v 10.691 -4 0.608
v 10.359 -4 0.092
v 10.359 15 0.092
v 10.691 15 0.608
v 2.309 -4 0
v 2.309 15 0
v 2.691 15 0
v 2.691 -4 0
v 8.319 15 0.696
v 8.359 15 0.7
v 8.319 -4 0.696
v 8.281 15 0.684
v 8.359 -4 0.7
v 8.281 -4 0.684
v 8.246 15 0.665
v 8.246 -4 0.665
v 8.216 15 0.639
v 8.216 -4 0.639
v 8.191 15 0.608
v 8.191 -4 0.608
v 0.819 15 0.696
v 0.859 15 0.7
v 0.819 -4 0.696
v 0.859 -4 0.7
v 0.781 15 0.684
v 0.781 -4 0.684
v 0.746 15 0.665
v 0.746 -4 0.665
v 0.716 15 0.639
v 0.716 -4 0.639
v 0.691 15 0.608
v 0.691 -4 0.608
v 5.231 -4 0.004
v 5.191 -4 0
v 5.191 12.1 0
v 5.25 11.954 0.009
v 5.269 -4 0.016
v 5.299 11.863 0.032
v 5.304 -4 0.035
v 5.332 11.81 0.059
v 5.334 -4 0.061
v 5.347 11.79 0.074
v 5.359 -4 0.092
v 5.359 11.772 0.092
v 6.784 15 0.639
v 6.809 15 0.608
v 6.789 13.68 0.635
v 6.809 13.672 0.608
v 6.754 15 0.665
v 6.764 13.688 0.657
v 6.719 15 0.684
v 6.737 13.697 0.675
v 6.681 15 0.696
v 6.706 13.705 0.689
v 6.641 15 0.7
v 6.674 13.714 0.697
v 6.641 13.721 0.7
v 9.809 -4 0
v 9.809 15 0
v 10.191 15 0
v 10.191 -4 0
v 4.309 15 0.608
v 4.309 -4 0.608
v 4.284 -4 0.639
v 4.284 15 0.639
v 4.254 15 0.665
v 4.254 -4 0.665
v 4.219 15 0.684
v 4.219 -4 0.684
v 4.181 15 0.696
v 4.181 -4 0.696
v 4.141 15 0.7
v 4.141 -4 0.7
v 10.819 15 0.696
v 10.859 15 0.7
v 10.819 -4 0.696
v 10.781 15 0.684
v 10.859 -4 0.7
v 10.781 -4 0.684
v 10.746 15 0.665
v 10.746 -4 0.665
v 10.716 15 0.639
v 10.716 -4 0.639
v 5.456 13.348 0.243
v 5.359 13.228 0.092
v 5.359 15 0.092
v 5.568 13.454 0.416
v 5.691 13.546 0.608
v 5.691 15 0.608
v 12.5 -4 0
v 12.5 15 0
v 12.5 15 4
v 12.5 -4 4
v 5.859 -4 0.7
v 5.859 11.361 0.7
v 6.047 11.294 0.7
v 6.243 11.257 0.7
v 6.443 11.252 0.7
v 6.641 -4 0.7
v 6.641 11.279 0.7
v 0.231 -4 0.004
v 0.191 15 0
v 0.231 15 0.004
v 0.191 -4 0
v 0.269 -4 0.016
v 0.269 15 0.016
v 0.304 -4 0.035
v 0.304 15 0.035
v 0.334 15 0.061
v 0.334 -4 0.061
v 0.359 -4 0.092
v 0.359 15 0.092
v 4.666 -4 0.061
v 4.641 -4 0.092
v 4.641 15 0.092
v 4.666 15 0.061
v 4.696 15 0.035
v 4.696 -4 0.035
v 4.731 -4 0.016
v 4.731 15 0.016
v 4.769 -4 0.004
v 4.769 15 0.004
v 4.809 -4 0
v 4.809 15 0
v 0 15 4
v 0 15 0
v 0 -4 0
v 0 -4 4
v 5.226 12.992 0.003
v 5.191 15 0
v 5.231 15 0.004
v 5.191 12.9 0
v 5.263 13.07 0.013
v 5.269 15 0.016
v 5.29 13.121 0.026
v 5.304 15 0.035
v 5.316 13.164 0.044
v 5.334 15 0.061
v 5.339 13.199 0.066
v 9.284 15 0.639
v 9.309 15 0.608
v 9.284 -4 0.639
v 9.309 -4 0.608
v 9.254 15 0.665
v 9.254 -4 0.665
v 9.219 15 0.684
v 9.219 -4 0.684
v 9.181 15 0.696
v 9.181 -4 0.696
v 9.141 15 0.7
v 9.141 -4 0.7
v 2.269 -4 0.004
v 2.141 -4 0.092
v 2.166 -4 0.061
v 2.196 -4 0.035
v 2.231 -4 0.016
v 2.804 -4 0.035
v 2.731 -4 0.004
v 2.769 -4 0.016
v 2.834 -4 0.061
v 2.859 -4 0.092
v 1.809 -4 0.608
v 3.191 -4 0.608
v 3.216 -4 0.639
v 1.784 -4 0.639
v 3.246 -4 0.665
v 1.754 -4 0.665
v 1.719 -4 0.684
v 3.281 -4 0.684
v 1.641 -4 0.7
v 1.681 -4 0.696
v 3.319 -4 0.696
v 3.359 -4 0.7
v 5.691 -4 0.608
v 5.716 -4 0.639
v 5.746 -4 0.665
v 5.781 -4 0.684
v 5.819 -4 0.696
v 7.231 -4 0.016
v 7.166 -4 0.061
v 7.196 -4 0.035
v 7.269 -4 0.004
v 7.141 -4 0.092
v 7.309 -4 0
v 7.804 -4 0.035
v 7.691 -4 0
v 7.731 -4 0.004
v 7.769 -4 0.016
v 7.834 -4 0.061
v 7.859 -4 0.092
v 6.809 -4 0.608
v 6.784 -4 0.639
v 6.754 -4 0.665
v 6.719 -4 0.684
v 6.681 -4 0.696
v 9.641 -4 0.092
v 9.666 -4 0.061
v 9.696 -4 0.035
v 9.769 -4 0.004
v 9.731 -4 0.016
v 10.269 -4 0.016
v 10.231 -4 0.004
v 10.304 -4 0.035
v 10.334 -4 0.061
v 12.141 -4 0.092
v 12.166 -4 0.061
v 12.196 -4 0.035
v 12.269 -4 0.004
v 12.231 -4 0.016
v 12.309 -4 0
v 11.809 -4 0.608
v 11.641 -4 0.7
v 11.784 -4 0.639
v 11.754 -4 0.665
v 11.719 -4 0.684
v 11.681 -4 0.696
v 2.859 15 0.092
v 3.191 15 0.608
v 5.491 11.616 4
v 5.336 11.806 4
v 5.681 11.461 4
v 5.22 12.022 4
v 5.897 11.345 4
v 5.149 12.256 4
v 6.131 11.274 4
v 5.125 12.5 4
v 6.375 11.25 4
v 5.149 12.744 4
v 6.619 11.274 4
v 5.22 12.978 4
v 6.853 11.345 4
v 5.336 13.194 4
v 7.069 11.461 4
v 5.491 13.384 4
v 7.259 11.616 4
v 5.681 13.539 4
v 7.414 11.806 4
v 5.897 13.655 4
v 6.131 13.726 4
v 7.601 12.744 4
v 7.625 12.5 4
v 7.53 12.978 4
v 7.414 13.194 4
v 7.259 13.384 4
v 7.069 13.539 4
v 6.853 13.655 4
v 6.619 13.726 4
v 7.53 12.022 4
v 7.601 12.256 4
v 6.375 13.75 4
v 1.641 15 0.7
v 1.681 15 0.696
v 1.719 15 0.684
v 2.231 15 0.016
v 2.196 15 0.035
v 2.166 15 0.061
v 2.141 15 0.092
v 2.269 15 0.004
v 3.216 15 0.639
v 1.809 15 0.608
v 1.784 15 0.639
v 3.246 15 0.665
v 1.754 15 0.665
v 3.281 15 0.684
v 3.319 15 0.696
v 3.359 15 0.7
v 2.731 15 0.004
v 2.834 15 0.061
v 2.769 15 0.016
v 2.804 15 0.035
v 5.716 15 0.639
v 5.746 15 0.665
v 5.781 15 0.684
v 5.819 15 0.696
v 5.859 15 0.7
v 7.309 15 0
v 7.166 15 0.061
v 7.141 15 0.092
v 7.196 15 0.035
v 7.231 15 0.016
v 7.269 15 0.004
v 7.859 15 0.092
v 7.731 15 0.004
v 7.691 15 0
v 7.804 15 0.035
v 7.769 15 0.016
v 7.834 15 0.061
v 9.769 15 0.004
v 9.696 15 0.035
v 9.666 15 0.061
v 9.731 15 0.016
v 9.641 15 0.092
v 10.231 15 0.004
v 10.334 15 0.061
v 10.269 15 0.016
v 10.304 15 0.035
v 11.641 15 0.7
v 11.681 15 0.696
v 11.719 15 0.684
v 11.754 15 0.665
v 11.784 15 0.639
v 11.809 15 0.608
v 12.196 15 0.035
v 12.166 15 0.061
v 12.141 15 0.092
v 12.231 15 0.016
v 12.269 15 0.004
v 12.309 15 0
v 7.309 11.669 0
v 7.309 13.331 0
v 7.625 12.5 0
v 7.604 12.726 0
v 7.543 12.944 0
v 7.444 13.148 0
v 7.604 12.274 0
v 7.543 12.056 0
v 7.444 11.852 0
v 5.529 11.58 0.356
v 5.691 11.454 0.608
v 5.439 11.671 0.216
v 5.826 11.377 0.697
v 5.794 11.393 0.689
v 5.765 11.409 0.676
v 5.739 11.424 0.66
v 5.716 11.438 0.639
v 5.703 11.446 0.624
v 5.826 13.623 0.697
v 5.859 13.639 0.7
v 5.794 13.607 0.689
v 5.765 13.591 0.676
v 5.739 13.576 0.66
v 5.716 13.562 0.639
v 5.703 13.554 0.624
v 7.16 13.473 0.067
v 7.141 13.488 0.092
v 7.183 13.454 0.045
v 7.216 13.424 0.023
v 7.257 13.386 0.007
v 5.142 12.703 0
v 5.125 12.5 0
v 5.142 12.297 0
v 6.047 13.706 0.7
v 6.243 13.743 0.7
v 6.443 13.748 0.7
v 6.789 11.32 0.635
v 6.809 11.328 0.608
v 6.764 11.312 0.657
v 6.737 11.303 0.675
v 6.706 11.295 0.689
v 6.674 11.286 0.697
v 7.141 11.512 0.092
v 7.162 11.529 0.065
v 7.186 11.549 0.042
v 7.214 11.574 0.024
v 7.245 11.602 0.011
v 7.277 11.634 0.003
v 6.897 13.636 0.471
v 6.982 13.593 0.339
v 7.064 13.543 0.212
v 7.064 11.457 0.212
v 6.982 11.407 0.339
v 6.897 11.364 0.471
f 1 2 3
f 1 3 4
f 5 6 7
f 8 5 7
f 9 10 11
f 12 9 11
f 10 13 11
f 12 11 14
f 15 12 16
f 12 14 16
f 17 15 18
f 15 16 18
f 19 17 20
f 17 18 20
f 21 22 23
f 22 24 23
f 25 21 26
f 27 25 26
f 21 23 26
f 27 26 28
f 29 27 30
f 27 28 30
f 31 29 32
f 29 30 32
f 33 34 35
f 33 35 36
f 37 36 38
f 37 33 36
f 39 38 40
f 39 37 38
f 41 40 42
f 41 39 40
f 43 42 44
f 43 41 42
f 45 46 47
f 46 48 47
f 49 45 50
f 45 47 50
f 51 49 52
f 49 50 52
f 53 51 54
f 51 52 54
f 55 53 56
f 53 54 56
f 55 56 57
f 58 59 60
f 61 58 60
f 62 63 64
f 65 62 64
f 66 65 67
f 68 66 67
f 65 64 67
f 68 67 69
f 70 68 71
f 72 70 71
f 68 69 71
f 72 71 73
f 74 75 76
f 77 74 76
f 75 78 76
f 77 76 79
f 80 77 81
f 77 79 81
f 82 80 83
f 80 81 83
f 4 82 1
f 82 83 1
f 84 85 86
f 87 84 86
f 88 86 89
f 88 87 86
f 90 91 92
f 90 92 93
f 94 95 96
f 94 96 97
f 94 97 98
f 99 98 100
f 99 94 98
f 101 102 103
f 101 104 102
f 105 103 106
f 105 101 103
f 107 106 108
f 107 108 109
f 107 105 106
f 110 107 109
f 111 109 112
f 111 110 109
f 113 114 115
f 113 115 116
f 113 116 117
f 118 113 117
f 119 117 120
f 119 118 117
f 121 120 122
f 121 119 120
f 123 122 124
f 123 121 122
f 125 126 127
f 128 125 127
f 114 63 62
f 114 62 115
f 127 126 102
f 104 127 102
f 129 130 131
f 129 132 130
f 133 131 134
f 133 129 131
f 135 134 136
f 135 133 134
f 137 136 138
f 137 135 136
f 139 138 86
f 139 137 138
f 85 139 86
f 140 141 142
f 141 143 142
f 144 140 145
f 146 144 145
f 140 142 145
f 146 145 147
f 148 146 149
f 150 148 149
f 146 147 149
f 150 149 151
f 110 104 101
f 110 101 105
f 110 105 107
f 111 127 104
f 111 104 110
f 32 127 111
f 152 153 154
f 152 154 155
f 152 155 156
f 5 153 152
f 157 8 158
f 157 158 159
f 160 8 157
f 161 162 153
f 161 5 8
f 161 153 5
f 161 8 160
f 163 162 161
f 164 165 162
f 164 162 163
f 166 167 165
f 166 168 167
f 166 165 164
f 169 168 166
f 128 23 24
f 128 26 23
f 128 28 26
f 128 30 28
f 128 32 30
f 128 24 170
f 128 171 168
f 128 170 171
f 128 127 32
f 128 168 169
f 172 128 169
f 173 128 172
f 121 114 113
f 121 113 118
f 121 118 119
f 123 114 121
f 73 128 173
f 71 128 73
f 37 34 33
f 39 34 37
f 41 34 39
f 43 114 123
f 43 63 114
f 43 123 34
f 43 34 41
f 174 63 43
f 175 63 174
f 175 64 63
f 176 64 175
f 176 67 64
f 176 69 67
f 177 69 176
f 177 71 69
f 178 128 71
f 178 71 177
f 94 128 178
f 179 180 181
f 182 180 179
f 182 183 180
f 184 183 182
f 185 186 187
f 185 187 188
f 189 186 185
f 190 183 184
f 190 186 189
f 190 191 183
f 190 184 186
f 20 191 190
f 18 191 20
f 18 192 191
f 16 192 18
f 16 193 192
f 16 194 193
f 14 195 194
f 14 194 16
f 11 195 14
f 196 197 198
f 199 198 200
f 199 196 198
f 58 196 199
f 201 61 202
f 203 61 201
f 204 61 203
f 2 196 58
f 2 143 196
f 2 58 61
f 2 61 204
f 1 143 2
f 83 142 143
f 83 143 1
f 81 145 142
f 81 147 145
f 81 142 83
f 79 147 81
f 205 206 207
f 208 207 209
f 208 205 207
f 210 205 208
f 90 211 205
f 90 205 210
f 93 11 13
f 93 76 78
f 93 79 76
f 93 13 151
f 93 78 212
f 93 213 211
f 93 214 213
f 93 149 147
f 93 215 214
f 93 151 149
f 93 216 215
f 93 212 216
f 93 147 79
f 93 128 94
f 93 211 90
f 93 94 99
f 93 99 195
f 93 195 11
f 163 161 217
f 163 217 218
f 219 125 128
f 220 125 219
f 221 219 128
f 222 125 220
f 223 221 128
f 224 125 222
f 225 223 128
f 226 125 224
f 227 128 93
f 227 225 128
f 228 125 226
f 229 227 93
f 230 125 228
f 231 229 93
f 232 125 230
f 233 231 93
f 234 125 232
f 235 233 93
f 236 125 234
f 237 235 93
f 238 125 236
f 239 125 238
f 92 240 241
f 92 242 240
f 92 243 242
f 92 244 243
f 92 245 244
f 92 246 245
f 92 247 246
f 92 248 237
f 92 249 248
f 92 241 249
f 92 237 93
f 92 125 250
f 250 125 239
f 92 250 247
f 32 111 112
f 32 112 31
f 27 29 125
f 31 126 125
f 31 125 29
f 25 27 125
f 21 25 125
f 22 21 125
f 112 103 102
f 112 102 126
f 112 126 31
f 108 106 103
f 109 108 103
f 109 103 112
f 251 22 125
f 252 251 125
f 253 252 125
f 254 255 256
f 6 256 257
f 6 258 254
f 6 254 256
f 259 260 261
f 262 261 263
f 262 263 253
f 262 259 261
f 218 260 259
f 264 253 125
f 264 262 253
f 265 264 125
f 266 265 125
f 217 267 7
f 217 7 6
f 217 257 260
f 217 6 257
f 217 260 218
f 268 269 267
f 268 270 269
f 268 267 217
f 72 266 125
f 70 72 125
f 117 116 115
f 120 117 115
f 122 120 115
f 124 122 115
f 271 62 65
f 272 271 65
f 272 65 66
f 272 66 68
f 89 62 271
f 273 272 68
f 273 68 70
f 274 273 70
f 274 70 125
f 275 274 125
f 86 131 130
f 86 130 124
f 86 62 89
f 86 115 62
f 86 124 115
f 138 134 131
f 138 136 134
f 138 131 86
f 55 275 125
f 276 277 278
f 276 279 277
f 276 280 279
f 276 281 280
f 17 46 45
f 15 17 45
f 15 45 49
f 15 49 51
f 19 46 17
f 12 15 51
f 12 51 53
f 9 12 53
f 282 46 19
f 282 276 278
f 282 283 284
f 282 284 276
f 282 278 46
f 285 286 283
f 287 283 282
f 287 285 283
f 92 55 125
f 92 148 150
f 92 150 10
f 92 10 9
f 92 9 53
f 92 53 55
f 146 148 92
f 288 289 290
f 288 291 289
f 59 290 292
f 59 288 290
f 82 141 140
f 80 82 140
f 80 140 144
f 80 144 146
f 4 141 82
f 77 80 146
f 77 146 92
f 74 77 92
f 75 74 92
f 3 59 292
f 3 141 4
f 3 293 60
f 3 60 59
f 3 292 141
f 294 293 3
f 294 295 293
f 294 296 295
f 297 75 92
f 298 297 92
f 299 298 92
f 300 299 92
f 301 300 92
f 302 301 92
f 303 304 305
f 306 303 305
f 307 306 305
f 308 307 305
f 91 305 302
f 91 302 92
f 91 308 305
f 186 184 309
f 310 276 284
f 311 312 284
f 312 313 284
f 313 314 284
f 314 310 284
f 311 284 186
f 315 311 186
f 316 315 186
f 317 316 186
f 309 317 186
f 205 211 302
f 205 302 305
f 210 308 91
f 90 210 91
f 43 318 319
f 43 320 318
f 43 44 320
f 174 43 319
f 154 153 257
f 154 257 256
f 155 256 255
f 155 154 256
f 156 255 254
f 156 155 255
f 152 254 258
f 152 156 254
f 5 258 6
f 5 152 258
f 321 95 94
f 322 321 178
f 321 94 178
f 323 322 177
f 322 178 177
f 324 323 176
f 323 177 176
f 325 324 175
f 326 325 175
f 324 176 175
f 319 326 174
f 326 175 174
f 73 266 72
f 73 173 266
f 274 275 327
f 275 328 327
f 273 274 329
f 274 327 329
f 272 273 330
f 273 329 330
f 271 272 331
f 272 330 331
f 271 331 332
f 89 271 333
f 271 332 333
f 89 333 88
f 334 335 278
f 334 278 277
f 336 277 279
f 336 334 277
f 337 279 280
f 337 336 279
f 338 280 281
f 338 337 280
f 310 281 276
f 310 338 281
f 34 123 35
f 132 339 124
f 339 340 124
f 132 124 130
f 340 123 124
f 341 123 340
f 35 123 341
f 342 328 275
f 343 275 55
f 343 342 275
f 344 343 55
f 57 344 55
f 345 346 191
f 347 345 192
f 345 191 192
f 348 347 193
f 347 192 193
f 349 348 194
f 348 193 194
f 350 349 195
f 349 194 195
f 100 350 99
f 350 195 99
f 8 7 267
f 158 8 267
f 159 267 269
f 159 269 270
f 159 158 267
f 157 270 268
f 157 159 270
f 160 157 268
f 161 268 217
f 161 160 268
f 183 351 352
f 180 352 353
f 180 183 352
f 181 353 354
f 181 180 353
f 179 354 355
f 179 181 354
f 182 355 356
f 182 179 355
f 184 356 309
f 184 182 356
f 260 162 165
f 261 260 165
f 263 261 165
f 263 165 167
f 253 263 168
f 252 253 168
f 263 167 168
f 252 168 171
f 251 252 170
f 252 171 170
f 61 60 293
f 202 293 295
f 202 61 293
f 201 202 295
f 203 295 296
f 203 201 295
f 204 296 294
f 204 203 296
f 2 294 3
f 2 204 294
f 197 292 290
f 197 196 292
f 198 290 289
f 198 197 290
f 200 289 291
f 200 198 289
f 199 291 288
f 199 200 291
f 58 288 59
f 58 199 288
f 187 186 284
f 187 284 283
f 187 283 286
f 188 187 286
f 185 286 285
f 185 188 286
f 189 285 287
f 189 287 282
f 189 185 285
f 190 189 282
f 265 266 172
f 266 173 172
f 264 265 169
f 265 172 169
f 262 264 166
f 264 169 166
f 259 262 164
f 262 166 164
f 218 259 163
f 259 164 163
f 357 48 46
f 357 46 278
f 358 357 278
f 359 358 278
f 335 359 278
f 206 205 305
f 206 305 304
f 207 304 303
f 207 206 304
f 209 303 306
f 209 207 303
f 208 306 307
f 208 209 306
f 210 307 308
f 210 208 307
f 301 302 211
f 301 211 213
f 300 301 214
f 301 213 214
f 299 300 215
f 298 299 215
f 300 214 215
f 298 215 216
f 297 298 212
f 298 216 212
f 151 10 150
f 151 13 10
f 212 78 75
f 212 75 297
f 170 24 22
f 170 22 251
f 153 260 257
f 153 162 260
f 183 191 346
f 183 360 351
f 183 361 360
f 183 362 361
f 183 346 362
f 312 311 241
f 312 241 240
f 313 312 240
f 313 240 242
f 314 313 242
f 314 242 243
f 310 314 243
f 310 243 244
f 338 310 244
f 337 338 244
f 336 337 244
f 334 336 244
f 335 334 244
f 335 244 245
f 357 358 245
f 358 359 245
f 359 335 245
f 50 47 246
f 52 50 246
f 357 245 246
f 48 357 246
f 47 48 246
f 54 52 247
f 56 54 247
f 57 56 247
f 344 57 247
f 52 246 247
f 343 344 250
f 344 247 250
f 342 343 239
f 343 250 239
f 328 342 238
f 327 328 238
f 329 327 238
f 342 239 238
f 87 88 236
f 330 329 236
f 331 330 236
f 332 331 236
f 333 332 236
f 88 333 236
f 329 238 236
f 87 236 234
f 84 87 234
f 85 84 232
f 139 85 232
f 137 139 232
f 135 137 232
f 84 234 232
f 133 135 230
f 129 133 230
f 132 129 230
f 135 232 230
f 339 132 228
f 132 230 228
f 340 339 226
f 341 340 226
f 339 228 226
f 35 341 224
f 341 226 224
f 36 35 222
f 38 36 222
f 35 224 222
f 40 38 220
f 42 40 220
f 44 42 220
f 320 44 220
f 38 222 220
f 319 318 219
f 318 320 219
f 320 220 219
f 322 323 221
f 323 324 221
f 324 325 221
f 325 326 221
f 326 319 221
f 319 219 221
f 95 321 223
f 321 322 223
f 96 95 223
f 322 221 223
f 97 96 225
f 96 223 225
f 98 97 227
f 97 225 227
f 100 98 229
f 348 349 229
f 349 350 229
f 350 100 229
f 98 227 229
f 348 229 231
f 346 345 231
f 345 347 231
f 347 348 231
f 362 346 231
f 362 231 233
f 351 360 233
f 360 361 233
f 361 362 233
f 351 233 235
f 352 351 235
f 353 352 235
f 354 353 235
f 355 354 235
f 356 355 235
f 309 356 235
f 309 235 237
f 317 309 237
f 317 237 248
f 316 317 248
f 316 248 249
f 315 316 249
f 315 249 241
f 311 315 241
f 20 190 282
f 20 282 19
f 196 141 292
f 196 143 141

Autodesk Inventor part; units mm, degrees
ref_plane "YZ Plane" through (0, 0, 0) normal (1, 0, 0) x (0, 1, 0)
ref_plane "XZ Plane" through (0, 0, 0) normal (0, 1, 0) x (-1, 0, 0)
ref_plane "XY Plane" through (0, 0, 0) normal (0, 0, 1) x (1, 0, 0)
sketch "Sketch1" plane through (0, 0, 0) normal (0, 0, 1) x (1, 0, 0)
  line L0 (12.5, 15) -> (12.5, 0)
  line L1 (0, 0) -> (12.5, 0)
  line L2 (0, 15) -> (12.5, 15)
  line L3 (0, 15) -> (0, 0)
extrude "Extrusion2" add sketch "Sketch1" along normal blind 4
sketch "Sketch2" plane through (0, 0, 0) normal (0, -1, 0) x (1, 0, 0)
  line L0 (12.5, 0) -> (0, 0) projected
  line L1 (12.5, 0) -> (12.5, 4) projected
  line L2 (0, 4) -> (12.5, 4) projected
  line L3 (0, 0) -> (0, 4) projected
extrude "Extrusion3" add sketch "Sketch2" along normal blind 4
sketch "Sketch4" plane through (0, -4, 0) normal (0, -1, 0) x (1, 0, 0)
  line L0 (10, 0) -> (10.1908, 0)
  line L1 (10.359, 0.0918) -> (10.691, 0.6082)
  line L2 (11.809, 0.6082) -> (12.141, 0.0918)
  line L3 (10.8592, 0.7) -> (11.6408, 0.7)
  arc A0 (11.809, 0.6082) -> (11.6408, 0.7) centre (11.6408, 0.5) ccw
  arc A1 (10.8592, 0.7) -> (10.691, 0.6082) centre (10.8592, 0.5) ccw
  line L4 (12.3092, 0) -> (12.5, 0)
  arc A2 (10.1908, 0) -> (10.359, 0.0918) centre (10.1908, 0.2) ccw
  arc A3 (12.141, 0.0918) -> (12.3092, 0) centre (12.3092, 0.2) ccw
  line L5 (7.5, 0) -> (7.6908, 0)
  arc A4 (7.6908, 0) -> (7.859, 0.0918) centre (7.6908, 0.2) ccw
  line L6 (7.859, 0.0918) -> (8.191, 0.6082)
  arc A5 (8.3592, 0.7) -> (8.191, 0.6082) centre (8.3592, 0.5) ccw
  line L7 (8.3592, 0.7) -> (9.1408, 0.7)
  arc A6 (9.309, 0.6082) -> (9.1408, 0.7) centre (9.1408, 0.5) ccw
  line L8 (9.309, 0.6082) -> (9.641, 0.0918)
  arc A7 (9.641, 0.0918) -> (9.8092, 0) centre (9.8092, 0.2) ccw
  line L9 (9.8092, 0) -> (10, 0)
  line L10 (5, 0) -> (5.1908, 0)
  arc A8 (5.1908, 0) -> (5.359, 0.0918) centre (5.1908, 0.2) ccw
  line L11 (5.359, 0.0918) -> (5.691, 0.6082)
  arc A9 (5.8592, 0.7) -> (5.691, 0.6082) centre (5.8592, 0.5) ccw
  line L12 (5.8592, 0.7) -> (6.6408, 0.7)
  arc A10 (6.809, 0.6082) -> (6.6408, 0.7) centre (6.6408, 0.5) ccw
  line L13 (6.809, 0.6082) -> (7.141, 0.0918)
  arc A11 (7.141, 0.0918) -> (7.3092, 0) centre (7.3092, 0.2) ccw
  line L14 (7.3092, 0) -> (7.5, 0)
  line L15 (2.5, 0) -> (2.6908, 0)
  arc A12 (2.6908, 0) -> (2.859, 0.0918) centre (2.6908, 0.2) ccw
  line L16 (2.859, 0.0918) -> (3.191, 0.6082)
  arc A13 (3.3592, 0.7) -> (3.191, 0.6082) centre (3.3592, 0.5) ccw
  line L17 (3.3592, 0.7) -> (4.1408, 0.7)
  arc A14 (4.309, 0.6082) -> (4.1408, 0.7) centre (4.1408, 0.5) ccw
  line L18 (4.309, 0.6082) -> (4.641, 0.0918)
  arc A15 (4.641, 0.0918) -> (4.8092, 0) centre (4.8092, 0.2) ccw
  line L19 (4.8092, 0) -> (5, 0)
  line L20 (0, 0) -> (0.1908, 0)
  arc A16 (0.1908, 0) -> (0.359, 0.0918) centre (0.1908, 0.2) ccw
  line L21 (0.359, 0.0918) -> (0.691, 0.6082)
  arc A17 (0.8592, 0.7) -> (0.691, 0.6082) centre (0.8592, 0.5) ccw
  line L22 (0.8592, 0.7) -> (1.6408, 0.7)
  arc A18 (1.809, 0.6082) -> (1.6408, 0.7) centre (1.6408, 0.5) ccw
  line L23 (1.809, 0.6082) -> (2.141, 0.0918)
  arc A19 (2.141, 0.0918) -> (2.3092, 0) centre (2.3092, 0.2) ccw
  line L24 (2.3092, 0) -> (2.5, 0)
  line L25 (7.3092, 0) -> (7.6908, 0)
  line L26 (9.8092, 0) -> (10.1908, 0)
  line L27 (12.3092, 0) -> (12.5, 0)
  line L28 (4.8092, 0) -> (5.1908, 0)
  line L29 (0, 0) -> (0.1908, 0)
  line L30 (2.3092, 0) -> (2.6908, 0)
  line L31 (12.5, 0) -> (12.5, -1)
  line L32 (12.5, -1) -> (0, -1)
  line L33 (0, -1) -> (0, 0)
  point P0 (0, 0)
  point P1 (0, 0)
  point P2 (10.3, 0)
  point P3 (12.2, 0)
  point P4 (7.8, 0)
  point P5 (9.7, 0)
  point P6 (5.3, 0)
  point P7 (7.2, 0)
  point P8 (2.8, 0)
  point P9 (4.7, 0)
  point P10 (0.3, 0)
  point P11 (2.2, 0)
  dimension "d11" = 0.3
  dimension "d12" = 0.2
  dimension "d13" = 0.2
  dimension "d14" = 2.5
  dimension "d16" = 1
extrude "Extrusion4" cut sketch "Sketch4" against normal through all
sketch "Sketch5" plane through (0, 0, 4) normal (0, 0, 1) x (1, 0, 0)
  arc A0 (7.3092, 11.7007) -> (7.3092, 13.2993) centre (6.375, 12.5) ccw projected
  circle A1 centre (6.375, 12.5) radius 1.25
  dimension "d19" = 2.5
extrude "Extrusion5" cut sketch "Sketch5" against normal through all
properties part number "belt clamp"
